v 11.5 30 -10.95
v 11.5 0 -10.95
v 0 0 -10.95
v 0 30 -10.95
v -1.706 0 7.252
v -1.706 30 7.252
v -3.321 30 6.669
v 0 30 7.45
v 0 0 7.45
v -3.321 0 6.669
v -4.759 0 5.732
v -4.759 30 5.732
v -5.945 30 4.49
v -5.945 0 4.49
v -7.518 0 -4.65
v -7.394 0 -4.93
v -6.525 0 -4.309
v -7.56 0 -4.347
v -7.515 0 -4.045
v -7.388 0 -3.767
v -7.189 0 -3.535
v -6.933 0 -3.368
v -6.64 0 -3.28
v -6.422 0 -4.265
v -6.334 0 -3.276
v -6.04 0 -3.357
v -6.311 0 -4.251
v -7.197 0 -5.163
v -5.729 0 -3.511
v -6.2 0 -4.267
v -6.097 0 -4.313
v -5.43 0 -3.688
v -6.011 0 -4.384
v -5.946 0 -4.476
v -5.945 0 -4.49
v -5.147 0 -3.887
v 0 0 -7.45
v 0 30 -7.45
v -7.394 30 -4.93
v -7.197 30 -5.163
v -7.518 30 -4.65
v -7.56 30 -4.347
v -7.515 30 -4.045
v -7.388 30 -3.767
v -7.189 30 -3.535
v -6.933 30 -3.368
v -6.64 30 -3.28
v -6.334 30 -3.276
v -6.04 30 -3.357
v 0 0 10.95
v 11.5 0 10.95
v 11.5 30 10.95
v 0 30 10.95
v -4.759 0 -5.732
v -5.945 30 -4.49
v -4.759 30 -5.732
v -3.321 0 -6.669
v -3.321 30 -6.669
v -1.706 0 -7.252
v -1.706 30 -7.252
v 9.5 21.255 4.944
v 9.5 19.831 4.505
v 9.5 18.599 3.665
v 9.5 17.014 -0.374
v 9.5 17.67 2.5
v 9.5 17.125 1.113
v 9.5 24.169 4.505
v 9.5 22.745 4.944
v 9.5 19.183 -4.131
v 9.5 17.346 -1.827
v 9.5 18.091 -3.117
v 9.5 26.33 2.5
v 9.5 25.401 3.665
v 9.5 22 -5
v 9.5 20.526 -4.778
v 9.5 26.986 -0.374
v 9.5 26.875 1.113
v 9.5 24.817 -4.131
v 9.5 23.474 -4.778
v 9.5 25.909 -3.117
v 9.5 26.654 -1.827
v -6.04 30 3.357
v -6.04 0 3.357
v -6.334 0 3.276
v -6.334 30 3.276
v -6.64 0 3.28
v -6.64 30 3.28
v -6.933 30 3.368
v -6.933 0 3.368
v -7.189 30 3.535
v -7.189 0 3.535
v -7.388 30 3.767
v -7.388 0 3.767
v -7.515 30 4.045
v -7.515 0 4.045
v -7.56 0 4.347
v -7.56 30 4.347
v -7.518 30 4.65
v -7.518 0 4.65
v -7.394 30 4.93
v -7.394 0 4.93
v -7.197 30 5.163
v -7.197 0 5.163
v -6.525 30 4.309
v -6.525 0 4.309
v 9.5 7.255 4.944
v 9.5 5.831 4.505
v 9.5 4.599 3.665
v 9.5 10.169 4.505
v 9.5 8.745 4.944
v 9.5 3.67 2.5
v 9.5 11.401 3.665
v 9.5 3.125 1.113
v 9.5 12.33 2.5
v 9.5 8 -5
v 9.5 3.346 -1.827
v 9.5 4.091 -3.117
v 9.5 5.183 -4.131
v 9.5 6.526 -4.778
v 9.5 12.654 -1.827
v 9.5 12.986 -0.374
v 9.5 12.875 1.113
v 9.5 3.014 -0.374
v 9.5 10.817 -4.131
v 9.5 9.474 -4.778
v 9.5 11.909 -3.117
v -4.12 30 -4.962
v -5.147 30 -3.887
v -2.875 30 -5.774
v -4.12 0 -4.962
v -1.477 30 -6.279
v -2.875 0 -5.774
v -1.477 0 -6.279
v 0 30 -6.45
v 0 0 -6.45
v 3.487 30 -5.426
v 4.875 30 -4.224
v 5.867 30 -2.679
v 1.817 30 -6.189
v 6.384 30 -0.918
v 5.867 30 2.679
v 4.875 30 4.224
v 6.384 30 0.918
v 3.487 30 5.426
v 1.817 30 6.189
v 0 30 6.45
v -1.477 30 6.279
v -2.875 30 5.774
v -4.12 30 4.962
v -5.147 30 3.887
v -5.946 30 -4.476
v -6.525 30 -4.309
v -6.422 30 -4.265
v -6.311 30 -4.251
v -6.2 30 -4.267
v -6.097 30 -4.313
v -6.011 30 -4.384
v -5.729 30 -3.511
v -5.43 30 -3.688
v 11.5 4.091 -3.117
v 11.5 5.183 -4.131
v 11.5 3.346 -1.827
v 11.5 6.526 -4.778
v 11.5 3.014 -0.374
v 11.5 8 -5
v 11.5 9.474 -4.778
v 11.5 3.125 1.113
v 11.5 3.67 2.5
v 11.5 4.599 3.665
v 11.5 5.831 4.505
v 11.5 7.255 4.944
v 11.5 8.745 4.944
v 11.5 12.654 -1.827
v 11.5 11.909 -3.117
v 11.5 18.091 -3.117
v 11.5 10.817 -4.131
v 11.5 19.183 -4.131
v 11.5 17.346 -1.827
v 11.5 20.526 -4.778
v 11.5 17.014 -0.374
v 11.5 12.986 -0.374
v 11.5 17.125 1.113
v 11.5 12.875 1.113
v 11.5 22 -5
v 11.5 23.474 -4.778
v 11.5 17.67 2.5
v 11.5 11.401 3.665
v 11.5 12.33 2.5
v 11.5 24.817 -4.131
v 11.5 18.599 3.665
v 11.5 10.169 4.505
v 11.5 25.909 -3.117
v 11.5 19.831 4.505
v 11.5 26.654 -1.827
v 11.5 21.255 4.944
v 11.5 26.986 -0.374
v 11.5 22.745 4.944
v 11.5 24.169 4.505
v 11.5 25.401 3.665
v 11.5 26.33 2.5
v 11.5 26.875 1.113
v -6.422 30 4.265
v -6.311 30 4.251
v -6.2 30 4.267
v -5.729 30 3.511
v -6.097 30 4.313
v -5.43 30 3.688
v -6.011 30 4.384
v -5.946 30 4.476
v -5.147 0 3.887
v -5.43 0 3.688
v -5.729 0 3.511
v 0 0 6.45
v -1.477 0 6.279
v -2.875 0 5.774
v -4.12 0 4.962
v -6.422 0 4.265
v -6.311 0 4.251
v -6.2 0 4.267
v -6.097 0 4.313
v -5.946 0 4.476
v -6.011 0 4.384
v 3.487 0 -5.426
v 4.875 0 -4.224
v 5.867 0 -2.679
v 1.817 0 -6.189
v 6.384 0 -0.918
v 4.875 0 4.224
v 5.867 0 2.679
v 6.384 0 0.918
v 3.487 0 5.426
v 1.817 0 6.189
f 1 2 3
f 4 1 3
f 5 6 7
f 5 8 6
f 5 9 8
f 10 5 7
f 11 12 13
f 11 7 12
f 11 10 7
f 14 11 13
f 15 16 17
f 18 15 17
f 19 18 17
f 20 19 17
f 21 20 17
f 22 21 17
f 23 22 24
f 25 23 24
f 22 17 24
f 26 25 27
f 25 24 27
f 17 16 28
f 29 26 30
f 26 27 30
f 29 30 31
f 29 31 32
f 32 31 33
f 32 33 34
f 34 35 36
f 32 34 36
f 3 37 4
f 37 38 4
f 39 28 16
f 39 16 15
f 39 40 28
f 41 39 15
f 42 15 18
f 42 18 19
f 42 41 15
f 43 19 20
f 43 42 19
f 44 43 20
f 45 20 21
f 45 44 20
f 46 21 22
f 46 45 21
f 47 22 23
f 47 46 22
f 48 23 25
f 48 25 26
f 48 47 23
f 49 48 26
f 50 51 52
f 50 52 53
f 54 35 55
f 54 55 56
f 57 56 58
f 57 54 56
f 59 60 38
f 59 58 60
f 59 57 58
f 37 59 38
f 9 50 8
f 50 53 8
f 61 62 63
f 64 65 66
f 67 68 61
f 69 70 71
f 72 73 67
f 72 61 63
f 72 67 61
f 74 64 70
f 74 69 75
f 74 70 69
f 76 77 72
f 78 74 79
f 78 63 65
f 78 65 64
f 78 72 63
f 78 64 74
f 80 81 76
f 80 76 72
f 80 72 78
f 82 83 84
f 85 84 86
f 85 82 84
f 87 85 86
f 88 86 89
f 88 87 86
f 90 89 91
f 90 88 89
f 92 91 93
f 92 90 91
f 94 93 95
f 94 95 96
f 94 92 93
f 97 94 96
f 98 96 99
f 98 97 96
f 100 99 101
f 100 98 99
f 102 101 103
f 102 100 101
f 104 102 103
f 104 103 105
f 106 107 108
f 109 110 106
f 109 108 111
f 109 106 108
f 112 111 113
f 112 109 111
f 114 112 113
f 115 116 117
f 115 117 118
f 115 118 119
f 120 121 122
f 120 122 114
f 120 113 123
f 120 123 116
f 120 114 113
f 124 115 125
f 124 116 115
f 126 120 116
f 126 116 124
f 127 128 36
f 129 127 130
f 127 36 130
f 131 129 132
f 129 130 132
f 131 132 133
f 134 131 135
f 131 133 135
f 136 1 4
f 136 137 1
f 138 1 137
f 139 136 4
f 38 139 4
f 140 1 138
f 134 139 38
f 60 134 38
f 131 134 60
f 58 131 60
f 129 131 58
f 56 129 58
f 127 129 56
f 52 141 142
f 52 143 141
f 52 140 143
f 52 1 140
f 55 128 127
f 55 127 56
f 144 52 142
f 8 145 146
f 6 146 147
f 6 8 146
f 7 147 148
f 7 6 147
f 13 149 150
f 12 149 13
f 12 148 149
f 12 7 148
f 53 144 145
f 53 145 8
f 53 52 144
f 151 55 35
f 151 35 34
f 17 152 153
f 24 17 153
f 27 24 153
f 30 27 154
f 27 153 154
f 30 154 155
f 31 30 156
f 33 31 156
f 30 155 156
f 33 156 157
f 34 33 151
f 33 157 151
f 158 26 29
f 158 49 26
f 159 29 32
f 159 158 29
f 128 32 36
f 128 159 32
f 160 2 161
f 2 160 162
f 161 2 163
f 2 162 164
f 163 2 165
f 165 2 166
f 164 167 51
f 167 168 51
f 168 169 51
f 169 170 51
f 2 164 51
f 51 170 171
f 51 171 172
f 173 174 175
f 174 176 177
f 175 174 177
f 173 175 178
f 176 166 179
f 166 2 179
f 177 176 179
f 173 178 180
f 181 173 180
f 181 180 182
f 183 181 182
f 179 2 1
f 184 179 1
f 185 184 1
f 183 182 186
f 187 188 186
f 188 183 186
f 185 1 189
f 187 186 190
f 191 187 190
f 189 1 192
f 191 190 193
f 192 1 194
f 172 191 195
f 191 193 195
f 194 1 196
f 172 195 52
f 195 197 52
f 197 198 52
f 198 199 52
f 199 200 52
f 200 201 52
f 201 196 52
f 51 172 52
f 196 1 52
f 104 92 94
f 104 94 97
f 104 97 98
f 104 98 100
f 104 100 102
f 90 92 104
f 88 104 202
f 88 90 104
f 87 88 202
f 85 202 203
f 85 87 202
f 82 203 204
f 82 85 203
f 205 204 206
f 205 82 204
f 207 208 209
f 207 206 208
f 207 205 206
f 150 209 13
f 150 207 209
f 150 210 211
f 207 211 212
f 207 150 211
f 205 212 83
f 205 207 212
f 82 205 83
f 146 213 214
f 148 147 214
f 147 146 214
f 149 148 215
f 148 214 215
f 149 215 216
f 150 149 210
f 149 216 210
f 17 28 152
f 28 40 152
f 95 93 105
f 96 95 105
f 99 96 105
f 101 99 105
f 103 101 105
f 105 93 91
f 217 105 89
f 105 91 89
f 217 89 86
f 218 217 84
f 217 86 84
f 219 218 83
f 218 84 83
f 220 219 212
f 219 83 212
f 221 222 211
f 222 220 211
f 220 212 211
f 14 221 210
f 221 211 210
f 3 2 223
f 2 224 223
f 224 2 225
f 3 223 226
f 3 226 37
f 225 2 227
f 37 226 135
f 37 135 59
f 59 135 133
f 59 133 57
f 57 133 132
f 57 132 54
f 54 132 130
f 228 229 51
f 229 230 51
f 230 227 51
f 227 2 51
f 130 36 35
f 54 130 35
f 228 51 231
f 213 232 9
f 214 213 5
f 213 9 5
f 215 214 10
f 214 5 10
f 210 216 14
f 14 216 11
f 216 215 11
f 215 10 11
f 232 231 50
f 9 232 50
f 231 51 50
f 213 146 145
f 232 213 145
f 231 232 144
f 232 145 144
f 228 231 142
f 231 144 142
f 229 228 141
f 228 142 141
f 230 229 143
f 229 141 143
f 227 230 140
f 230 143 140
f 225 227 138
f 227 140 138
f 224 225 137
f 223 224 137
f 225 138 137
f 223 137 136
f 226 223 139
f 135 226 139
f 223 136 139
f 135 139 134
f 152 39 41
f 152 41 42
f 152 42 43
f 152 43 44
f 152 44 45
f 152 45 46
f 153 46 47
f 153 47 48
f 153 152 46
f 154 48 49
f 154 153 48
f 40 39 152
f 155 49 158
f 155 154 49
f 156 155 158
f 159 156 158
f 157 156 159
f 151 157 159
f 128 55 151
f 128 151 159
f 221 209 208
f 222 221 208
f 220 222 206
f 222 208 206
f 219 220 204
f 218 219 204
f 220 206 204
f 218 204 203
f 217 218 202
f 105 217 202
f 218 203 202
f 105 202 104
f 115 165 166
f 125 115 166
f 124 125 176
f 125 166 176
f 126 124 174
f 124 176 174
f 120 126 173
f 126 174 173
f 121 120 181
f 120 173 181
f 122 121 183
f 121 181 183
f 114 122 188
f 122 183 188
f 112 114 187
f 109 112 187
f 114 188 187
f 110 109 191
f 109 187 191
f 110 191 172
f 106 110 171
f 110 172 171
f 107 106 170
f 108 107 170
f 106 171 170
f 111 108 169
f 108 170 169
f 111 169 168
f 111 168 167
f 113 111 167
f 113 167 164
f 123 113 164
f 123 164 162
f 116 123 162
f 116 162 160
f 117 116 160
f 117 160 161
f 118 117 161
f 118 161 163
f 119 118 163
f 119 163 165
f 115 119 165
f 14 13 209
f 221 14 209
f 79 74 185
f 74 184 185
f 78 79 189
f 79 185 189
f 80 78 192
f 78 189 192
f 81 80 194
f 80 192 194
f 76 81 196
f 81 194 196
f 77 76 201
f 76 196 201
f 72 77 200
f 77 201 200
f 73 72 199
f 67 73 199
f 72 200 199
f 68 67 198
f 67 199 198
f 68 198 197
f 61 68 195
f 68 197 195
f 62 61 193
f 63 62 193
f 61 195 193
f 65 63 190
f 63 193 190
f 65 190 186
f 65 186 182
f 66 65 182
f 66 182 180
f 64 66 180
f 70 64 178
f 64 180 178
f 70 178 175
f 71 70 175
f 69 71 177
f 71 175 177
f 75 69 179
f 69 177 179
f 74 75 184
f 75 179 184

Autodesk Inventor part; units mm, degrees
ref_plane "YZ Plane" through (0, 0, 0) normal (1, 0, 0) x (0, 1, 0)
ref_plane "XZ Plane" through (0, 0, 0) normal (0, 1, 0) x (-1, 0, 0)
ref_plane "XY Plane" through (0, 0, 0) normal (0, 0, 1) x (1, 0, 0)
sketch "Эскиз1" plane through (0, 0, 0) normal (0, 1, 0) x (-1, 0, 0)
  circle A0 centre (0, 0) radius 6.45
  circle A1 centre (0, 0) radius 7.45
  line L0 (0, 0) -> (5.9449, 4.49)
  line L1 (0, 0) -> (5.9449, -4.49)
  point P0 (5.147, -3.8873)
  point P1 (5.147, 3.8873)
  dimension "d0" = 12.9
  dimension "d1" = 14.9
extrude "Выдавливание1" add sketch "Эскиз1" along normal blind 30 contours A0 L1 A1 L0 picked at (-6.4749, 2.8302)
sketch "Эскиз2" plane through (0, 30, 0) normal (0, 1, 0) x (1, 0, 0)
  arc A0 (-5.147, -3.8873) -> (-6.0397, -3.3574) centre (-7.8483, -7.4212) ccw
  arc A1 (-6.0397, -3.3574) -> (-7.1966, -5.1632) centre (-6.474, -4.3526) ccw
  line L0 (-7.1966, -5.1632) -> (-6.5253, -4.3087)
  arc A2 (-5.9464, -4.4755) -> (-6.5253, -4.3087) centre (-6.3147, -4.6659) ccw
  line L1 (-5.147, -3.8873) -> (-5.9449, -4.49)
  line L2 (-5.9449, -4.49) -> (-5.147, -3.8873)
  line L3 (-5.9449, -4.49) -> (-5.9464, -4.4755)
  line L4 (-0.0151, 0) -> (-3.489, 0)
  arc A3 (-6.0397, 3.3574) -> (-5.147, 3.8873) centre (-7.8483, 7.4212) ccw
  arc A4 (-6.5253, 4.3087) -> (-5.9464, 4.4755) centre (-6.3147, 4.6659) ccw
  line L5 (-5.147, 3.8873) -> (-5.9449, 4.49)
  line L6 (-5.9449, 4.49) -> (-5.147, 3.8873)
  line L7 (-5.9449, 4.49) -> (-5.9464, 4.4755)
  arc A5 (-7.1966, 5.1632) -> (-6.0397, 3.3574) centre (-6.474, 4.3526) ccw
  line L8 (-7.1966, 5.1632) -> (-6.5253, 4.3087)
  point P0 (-5.147, 3.8873)
  point P1 (-5.9449, -4.49)
  point P2 (-5.3694, -4.0591)
  point P3 (-5.9449, 4.49)
  point P4 (-5.3694, 4.0591)
  point P5 (-5.9449, 4.49)
  dimension "d25" = 1.0859
sketch "Эскиз3" plane through (0, 30, 0) normal (0, 1, 0) x (1, 0, 0)
  arc A0 (-5.9449, -4.49) -> (-5.9449, 4.49) centre (0, 0) ccw projected
  line L0 (11.5, -6.95) -> (11.5, 6.95)
  arc A1 (-5.147, -3.8873) -> (-5.147, 3.8873) centre (0, 0) ccw projected
  line L1 (0, -7.45) -> (0, -6.45)
  line L2 (0, 6.45) -> (0, 7.45)
  line L3 (11.5, 6.95) -> (11.5, 10.95)
  line L4 (11.5, -6.95) -> (11.5, -10.95)
  line L5 (0, 2.95) -> (0, 7.45)
  line L6 (11.5, -10.95) -> (0, -10.95)
  line L7 (0, -10.95) -> (0, -7.45)
  line L8 (11.5, 10.95) -> (0, 10.95)
  line L9 (0, 10.95) -> (0, 7.45)
  arc A2 (0, -6.45) -> (0, 6.45) centre (0, 0) ccw
  dimension "d13" = 4
  dimension "d14" = 4
  dimension "d22" = 21.9
  dimension "d23" = 4.5
extrude "Выдавливание3" add sketch "Эскиз3" against normal blind 30
ref_plane "РабПлоскость1" through (11.5, 20, 4.95) normal (1, 0, 0) x (0, 0, -1)
sketch "Эскиз4" plane through (11.5, 20, 4.95) normal (1, 0, 0) x (0, 0, -1)
  line L0 (4.95, -20) -> (4.95, 10)
  line L1 (1, 10) -> (8.9, 10) projected
  circle A0 centre (4.95, -12) radius 5
  line L2 (14.4, -20) -> (-4.5, -20) projected
  circle A1 centre (4.95, 2) radius 5
  line L3 (-4.5, 10) -> (14.4, 10) projected
  point P0 (7.3306, 10)
  point P1 (2.5694, 10)
  point P2 (4.95, 10)
  dimension "d15" = 10
  dimension "d16" = 8
  dimension "d17" = 10
  dimension "d18" = 8
extrude "Выдавливание4" cut sketch "Эскиз4" against normal blind 2
extrude "Выдавливание5" add sketch "Эскиз2" against normal blind 30
sketch "Эскиз5" plane through (0, 30, 0) normal (0, 1, 0) x (1, 0, 0)
  arc A0 (0, 7.45) -> (-5.9449, 4.49) centre (0, 0) ccw projected
  line L0 (-5.9449, 4.49) -> (-5.9464, 4.4755) projected
  arc A1 (-6.5253, 4.3087) -> (-5.9464, 4.4755) centre (-6.3147, 4.6659) ccw projected
  line L1 (-6.5253, 4.3087) -> (-7.1966, 5.1632) projected
  arc A2 (-7.1966, 5.1632) -> (-6.0397, 3.3574) centre (-6.474, 4.3526) ccw projected
  arc A3 (-6.0397, 3.3574) -> (-5.147, 3.8873) centre (-7.8483, 7.4212) ccw projected
  arc A4 (-5.147, -3.8873) -> (-5.147, 3.8873) centre (0, 0) ccw projected
  arc A5 (-5.147, -3.8873) -> (-6.0397, -3.3574) centre (-7.8483, -7.4212) ccw projected
  arc A6 (-6.0397, -3.3574) -> (-7.1966, -5.1632) centre (-6.474, -4.3526) ccw projected
  line L2 (-7.1966, -5.1632) -> (-6.5253, -4.3087) projected
  arc A7 (-5.9464, -4.4755) -> (-6.5253, -4.3087) centre (-6.3147, -4.6659) ccw projected
  line L3 (-5.9464, -4.4755) -> (-5.9449, -4.49) projected
  arc A8 (-5.9449, -4.49) -> (0, -7.45) centre (0, 0) ccw projected
  line L4 (0, -7.45) -> (0, -10.95) projected
  line L5 (0, -10.95) -> (11.5, -10.95) projected
  line L6 (11.5, -10.95) -> (11.5, 10.95) projected
  line L7 (11.5, 10.95) -> (0, 10.95) projected
  line L8 (0, 10.95) -> (0, 7.45) projected
  line L9 (0, 6.45) -> (0, 7.45)
  line L10 (0, -6.45) -> (0, -7.45)
sketch "Эскиз6" plane through (11.5, 30, 10.95) normal (1, 0, 0) x (0, 0, -1)
  arc A0 (15.95, -22) -> (15.95, -22) centre (10.95, -22) ccw projected
  arc A1 (15.95, -8) -> (15.95, -8) centre (10.95, -8) ccw projected
  point P0 (10.95, -30)
properties part number "крепление маркера 13мм"
